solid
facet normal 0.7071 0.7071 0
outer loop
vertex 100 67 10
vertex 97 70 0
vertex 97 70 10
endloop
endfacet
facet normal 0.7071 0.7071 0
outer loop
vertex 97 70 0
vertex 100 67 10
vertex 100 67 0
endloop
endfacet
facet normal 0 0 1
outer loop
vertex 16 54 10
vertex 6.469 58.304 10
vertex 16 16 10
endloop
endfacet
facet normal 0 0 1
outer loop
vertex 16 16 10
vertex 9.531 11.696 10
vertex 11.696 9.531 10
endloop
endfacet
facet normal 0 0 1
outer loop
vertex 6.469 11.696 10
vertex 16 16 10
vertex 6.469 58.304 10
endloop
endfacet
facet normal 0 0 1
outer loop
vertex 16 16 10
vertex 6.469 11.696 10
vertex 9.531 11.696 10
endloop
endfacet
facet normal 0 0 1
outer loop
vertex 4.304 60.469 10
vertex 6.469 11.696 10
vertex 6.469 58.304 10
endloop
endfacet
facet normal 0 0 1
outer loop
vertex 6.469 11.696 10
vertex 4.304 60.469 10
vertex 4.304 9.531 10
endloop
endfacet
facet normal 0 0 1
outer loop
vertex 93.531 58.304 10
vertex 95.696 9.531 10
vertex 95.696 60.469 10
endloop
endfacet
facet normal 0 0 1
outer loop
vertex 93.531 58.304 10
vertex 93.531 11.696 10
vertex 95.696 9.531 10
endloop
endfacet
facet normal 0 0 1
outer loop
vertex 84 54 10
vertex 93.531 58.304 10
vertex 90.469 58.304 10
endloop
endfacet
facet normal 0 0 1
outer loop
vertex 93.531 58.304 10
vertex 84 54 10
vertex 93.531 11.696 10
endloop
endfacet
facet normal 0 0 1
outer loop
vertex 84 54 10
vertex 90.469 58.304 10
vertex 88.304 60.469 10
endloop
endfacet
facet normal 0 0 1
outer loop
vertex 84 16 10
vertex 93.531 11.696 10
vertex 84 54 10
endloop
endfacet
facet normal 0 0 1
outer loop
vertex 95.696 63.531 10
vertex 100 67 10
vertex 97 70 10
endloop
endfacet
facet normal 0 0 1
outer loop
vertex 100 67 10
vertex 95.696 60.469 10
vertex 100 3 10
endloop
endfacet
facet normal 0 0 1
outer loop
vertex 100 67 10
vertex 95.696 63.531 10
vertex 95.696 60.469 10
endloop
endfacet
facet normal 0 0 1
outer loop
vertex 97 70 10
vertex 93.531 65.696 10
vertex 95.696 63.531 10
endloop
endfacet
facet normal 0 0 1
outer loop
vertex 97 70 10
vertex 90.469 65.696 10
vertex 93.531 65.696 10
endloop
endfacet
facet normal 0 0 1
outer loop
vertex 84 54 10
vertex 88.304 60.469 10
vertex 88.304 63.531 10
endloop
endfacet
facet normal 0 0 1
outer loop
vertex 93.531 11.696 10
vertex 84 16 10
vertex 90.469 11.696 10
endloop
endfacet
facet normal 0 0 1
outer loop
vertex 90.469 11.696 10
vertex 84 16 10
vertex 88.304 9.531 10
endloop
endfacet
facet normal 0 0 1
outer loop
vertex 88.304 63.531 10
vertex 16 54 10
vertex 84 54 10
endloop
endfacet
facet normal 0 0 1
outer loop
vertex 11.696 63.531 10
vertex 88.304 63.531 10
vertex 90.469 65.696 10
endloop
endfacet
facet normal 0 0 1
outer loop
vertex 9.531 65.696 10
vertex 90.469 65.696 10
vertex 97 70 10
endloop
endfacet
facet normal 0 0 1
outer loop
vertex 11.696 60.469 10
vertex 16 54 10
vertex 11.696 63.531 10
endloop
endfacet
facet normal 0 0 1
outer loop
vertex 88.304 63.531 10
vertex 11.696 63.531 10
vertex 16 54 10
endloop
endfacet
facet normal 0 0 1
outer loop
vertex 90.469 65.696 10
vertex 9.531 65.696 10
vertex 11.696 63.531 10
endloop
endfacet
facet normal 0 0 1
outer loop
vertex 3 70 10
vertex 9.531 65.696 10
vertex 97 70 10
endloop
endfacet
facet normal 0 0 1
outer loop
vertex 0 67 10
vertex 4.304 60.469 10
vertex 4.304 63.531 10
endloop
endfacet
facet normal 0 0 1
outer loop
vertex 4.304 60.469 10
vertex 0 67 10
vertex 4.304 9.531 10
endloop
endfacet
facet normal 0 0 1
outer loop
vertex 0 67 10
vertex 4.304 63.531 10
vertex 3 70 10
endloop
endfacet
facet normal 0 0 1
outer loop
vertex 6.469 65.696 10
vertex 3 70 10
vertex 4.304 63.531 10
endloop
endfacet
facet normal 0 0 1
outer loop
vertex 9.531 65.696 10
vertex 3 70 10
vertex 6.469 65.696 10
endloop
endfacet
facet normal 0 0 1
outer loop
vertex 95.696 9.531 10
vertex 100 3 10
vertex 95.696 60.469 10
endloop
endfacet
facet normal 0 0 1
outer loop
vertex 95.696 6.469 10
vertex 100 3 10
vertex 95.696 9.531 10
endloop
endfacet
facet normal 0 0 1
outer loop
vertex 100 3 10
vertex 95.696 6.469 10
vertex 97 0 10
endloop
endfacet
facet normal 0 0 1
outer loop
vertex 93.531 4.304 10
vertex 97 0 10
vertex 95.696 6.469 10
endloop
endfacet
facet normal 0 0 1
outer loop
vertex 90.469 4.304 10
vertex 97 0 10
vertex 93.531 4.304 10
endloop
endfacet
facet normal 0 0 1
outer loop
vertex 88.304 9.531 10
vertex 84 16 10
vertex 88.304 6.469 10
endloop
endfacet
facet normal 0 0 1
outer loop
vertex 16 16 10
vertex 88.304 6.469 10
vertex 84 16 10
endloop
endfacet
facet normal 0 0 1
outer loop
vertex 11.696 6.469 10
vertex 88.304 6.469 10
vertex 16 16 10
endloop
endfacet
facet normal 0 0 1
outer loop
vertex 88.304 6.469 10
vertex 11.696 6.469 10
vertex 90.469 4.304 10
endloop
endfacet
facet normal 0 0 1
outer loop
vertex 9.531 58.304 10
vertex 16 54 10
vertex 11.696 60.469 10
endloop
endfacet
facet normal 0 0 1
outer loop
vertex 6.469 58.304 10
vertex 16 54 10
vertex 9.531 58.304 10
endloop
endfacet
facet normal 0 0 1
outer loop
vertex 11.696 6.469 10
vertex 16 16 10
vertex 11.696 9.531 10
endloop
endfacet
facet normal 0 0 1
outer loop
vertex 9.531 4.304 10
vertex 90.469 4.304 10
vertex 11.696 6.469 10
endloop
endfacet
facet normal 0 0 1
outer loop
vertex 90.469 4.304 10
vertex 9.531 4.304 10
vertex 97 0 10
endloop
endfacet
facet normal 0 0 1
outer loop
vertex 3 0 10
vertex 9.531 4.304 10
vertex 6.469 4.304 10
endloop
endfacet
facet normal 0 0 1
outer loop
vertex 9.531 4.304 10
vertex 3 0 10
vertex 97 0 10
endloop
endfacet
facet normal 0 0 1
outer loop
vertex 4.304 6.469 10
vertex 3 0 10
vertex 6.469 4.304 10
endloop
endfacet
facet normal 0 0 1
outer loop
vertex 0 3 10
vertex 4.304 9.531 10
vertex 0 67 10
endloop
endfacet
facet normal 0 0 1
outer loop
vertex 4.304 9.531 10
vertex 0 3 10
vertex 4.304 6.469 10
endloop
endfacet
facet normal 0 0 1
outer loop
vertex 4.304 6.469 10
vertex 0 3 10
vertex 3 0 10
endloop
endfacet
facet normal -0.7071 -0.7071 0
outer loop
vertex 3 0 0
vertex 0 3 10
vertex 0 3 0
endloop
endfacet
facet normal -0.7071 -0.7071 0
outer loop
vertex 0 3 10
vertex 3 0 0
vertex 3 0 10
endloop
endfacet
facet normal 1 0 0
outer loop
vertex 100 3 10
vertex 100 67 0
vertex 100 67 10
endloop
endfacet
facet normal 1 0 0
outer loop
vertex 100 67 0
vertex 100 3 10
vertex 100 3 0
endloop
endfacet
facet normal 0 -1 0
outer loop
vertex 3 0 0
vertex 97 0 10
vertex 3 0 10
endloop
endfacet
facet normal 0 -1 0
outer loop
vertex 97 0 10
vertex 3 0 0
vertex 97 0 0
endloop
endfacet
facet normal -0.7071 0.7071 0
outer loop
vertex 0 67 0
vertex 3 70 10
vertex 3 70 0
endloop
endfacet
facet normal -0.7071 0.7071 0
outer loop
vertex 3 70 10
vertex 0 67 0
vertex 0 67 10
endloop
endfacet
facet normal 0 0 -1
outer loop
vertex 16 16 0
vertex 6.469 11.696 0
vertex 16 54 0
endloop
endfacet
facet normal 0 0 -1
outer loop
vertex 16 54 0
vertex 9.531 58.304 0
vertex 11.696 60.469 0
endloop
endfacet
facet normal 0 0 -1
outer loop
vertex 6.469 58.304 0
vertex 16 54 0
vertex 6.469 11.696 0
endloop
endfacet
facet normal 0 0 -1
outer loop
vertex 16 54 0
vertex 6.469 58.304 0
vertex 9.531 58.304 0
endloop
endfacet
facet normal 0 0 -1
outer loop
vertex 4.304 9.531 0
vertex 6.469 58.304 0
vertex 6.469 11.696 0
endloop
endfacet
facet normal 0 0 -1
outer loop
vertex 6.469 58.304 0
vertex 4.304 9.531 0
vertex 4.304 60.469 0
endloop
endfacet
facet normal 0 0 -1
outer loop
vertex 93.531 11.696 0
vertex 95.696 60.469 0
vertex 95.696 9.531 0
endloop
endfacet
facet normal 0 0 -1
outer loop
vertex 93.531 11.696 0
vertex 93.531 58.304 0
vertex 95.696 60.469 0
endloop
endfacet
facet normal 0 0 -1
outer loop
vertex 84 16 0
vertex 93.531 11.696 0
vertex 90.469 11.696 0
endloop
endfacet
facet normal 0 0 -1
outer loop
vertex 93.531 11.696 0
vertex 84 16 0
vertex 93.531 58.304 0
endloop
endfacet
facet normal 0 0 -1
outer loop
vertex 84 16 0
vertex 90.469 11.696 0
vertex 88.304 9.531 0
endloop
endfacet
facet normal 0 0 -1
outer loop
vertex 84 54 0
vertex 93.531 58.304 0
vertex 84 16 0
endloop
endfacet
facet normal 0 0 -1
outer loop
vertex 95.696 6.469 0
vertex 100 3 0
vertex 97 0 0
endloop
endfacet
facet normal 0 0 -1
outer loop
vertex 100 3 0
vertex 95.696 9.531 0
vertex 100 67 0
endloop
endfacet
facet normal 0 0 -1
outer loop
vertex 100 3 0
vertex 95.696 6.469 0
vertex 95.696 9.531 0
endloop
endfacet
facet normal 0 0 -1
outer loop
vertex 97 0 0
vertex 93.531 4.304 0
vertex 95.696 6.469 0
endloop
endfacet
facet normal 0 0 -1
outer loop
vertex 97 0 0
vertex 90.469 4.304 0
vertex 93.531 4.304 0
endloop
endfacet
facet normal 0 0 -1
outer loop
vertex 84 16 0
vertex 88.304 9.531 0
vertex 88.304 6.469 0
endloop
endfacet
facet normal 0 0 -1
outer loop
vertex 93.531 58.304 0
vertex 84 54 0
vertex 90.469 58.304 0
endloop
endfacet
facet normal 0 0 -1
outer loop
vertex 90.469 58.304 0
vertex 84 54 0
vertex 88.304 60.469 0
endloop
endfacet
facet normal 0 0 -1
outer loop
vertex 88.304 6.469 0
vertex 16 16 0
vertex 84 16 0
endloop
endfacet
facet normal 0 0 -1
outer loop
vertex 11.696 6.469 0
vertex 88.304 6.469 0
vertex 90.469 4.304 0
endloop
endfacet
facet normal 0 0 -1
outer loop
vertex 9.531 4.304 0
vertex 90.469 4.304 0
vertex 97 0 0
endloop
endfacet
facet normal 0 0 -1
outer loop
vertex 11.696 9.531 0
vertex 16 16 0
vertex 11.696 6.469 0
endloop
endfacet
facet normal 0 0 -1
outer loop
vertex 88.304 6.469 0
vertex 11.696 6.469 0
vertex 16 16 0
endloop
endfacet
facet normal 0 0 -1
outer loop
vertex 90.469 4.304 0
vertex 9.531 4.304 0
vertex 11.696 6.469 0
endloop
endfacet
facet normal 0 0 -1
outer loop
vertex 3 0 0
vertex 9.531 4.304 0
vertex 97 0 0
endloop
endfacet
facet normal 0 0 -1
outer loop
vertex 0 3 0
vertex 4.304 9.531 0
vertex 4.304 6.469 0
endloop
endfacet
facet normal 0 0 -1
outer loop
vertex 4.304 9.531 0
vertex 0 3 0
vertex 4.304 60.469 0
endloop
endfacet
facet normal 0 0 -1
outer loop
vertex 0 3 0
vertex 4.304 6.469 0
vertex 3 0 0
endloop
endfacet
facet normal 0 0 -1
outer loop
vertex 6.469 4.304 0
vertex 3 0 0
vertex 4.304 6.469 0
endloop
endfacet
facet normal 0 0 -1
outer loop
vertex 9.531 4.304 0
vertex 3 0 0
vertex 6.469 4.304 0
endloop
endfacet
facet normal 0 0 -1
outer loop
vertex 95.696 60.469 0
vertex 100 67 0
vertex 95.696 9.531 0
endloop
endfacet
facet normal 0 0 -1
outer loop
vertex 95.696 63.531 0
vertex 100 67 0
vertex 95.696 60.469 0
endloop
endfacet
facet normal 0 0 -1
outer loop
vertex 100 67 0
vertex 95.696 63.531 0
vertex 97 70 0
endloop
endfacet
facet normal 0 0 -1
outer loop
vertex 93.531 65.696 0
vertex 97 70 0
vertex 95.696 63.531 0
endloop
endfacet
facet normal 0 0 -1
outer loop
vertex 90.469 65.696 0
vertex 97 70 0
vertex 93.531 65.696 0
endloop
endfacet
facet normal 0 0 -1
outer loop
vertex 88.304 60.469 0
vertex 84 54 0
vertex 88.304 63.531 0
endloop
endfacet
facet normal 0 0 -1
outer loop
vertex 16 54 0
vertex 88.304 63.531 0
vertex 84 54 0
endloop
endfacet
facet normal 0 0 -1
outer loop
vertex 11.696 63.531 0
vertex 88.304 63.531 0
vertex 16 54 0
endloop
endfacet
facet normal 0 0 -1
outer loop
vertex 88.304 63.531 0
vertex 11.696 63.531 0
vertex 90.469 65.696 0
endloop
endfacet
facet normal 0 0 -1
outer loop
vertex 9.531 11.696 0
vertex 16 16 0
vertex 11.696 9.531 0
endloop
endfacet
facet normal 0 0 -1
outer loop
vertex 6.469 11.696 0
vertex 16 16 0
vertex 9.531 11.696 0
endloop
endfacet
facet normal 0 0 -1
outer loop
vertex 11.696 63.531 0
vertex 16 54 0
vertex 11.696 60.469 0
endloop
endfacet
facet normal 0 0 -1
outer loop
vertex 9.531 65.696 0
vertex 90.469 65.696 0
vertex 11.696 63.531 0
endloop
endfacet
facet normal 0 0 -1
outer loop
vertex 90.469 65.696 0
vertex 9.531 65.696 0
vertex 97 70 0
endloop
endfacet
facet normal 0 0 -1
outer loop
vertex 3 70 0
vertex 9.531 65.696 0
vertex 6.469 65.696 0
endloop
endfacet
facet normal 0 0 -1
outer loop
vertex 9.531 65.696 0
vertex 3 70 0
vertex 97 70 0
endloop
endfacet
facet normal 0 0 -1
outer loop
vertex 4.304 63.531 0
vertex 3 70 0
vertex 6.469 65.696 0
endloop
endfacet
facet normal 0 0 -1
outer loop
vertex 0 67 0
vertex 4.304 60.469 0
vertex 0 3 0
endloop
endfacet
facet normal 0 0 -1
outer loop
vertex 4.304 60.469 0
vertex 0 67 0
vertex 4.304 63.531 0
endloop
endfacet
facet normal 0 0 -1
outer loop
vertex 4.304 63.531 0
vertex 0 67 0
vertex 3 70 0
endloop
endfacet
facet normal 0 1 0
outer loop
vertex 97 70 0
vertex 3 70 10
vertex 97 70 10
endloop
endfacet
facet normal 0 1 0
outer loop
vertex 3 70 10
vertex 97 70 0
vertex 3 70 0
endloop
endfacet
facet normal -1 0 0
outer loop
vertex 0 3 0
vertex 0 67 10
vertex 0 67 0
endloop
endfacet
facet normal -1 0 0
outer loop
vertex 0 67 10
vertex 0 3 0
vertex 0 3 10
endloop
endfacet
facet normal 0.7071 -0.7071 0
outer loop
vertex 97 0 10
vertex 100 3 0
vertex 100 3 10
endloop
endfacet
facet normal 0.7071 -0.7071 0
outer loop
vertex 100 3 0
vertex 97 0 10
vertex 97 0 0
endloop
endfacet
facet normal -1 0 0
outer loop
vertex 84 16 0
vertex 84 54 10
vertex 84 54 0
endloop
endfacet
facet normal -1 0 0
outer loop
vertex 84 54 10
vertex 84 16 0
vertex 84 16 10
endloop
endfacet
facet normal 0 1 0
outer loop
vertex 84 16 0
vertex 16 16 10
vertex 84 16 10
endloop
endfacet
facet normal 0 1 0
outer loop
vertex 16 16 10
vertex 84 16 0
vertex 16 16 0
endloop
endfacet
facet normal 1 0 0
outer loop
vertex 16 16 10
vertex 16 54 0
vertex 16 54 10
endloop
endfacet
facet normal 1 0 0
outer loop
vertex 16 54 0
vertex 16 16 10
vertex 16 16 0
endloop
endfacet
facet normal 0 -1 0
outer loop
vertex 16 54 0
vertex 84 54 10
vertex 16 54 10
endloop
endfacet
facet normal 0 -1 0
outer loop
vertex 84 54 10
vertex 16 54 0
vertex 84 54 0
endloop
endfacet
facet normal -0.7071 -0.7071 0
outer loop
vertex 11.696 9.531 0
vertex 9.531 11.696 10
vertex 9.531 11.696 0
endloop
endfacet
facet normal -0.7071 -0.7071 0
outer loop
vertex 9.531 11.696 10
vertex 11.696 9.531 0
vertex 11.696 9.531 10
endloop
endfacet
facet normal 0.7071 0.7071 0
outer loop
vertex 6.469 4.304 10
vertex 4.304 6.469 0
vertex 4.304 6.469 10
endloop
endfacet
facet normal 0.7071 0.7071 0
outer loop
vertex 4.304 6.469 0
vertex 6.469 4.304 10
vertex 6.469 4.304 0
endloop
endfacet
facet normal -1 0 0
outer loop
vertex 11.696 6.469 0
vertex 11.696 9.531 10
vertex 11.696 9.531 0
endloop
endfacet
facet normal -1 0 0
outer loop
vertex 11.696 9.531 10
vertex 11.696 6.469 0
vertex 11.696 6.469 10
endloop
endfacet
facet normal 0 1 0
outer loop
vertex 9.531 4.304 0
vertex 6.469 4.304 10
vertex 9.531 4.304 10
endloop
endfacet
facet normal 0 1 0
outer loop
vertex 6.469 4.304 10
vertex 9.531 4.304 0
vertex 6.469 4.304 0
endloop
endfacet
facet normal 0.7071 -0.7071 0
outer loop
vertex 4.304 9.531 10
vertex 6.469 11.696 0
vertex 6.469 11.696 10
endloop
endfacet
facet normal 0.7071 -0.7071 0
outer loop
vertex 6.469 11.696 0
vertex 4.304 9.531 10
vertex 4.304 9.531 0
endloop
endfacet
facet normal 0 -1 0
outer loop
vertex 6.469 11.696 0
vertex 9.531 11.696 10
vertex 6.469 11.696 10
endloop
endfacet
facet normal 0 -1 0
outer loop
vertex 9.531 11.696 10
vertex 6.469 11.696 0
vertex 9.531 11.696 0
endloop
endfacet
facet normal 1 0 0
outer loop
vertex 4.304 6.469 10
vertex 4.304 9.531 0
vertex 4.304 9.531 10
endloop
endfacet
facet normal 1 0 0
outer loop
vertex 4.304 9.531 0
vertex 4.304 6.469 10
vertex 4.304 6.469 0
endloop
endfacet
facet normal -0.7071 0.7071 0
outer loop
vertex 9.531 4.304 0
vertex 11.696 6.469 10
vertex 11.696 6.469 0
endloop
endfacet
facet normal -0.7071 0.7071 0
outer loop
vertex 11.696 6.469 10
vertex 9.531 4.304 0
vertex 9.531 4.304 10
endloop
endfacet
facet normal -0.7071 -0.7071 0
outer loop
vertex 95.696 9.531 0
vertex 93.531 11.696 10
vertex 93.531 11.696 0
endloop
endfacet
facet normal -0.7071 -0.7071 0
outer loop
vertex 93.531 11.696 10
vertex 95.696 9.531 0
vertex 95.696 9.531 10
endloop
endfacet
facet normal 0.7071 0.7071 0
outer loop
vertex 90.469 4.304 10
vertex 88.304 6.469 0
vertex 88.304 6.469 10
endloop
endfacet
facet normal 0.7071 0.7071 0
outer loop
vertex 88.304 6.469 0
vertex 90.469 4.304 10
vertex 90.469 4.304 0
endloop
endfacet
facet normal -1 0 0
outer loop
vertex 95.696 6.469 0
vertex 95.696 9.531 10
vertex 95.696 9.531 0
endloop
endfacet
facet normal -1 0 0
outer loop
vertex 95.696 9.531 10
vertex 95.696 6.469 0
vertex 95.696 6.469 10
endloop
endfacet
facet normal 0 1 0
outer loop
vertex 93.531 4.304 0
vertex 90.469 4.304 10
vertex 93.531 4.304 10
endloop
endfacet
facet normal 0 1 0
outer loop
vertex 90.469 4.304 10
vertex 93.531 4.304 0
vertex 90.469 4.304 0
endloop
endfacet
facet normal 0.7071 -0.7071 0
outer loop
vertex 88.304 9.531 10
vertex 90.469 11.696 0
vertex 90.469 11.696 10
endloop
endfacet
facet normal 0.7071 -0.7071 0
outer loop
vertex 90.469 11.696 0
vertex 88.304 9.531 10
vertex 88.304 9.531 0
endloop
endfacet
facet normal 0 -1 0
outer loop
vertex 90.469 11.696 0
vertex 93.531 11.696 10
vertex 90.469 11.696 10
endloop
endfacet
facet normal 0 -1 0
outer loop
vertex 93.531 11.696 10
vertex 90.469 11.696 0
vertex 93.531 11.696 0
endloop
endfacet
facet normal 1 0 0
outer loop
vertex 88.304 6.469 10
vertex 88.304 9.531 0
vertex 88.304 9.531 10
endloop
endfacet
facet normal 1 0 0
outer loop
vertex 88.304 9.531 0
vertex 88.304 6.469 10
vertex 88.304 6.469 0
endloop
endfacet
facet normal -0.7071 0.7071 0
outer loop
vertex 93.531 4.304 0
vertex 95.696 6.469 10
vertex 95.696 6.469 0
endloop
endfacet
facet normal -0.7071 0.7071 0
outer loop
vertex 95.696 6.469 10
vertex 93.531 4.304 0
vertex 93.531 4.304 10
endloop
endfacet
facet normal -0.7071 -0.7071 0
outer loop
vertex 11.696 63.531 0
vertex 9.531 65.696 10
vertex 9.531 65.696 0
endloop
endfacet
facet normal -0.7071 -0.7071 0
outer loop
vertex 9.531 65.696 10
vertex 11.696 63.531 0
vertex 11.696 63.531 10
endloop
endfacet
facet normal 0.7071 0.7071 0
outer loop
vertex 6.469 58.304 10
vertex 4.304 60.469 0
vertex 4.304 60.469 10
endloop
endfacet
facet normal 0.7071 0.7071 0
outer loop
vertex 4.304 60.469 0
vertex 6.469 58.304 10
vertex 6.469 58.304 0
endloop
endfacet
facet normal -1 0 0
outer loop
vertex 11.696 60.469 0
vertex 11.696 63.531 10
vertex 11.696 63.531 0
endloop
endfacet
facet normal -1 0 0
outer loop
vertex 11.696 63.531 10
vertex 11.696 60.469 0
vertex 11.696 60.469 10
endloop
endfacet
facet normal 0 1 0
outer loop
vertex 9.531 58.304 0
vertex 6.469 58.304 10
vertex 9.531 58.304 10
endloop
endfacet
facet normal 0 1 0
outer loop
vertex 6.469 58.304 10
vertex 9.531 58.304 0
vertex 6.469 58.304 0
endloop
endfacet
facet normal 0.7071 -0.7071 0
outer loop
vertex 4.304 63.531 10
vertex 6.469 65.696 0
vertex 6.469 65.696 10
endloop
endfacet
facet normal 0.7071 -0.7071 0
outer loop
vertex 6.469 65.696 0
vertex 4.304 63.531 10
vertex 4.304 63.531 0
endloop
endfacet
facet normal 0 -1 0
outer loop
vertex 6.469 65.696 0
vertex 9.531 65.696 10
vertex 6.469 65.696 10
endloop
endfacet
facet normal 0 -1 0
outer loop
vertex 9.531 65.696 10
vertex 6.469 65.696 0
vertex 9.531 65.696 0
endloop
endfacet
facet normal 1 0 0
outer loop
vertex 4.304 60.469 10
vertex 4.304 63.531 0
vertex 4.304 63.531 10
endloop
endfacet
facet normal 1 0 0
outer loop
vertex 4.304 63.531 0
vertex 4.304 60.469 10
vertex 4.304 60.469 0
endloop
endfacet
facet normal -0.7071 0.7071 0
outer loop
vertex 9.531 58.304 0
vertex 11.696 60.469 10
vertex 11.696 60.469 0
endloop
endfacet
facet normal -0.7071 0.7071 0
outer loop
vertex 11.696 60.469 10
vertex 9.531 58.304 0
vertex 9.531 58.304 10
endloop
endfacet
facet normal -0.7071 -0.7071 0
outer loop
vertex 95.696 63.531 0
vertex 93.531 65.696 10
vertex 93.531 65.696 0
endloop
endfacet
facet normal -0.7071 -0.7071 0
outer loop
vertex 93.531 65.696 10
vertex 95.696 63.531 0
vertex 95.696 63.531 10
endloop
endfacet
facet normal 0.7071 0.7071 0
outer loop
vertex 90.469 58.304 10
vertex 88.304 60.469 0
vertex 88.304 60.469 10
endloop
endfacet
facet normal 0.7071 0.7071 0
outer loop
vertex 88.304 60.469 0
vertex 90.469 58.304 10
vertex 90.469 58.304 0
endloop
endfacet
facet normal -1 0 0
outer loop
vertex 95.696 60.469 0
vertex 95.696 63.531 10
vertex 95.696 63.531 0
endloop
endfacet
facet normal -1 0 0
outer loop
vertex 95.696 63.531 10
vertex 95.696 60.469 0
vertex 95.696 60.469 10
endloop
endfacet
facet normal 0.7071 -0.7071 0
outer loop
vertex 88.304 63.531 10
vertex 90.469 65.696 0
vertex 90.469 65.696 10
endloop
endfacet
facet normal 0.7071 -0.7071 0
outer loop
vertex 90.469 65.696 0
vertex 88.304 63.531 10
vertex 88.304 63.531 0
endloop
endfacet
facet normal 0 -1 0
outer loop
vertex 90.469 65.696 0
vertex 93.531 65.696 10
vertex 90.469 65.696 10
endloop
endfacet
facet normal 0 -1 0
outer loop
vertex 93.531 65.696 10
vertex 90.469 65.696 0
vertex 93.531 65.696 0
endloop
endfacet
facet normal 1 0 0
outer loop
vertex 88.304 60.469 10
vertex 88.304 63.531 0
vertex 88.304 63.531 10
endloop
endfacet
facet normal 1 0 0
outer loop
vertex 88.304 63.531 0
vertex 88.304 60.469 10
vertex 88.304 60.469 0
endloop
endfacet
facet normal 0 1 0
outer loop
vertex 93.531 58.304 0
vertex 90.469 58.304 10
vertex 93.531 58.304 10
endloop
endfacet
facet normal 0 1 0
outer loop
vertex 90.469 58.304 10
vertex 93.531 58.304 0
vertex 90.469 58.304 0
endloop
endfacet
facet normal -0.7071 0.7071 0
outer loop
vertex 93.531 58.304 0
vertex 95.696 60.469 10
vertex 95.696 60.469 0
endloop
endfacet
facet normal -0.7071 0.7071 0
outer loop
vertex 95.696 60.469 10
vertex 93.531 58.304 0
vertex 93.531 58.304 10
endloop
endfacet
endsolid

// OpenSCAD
$fn = 32;

// ----------------------------------------------------------------------
// Frame plate: 100 x 70 frame, 16 mm rails
// ----------------------------------------------------------------------

// --- parameters (mm) ---
plate_l = 100;            // plate length, X
plate_w = 70;             // plate width, Y
plate_t = 10;             // plate thickness, Z (extrusion height)
corner_c = 3;             // corner chamfer
frame_bar = 16;           // frame rail width
bolt_r = 4;               // corner bolt window radius
bolt_inset = 8;           // bolt centre inset from the edges

win_l = plate_l - 2 * frame_bar;  // window length
win_w = plate_w - 2 * frame_bar;  // window width
bolt_d = 2 * bolt_r;  // corner hole diameter

profile = [[3, 0], [97, 0], [100, 3], [100, 67], [97, 70], [3, 70], [0, 67], [0, 3]];  // primary outline, 8 points, counter clockwise
void_1 = [[16, 16], [84, 16], [84, 54], [16, 54]];  // the window, 4 points
void_2 = [[11.696, 9.531], [9.531, 11.696], [6.469, 11.696], [4.304, 9.531], [4.304, 6.469], [6.469, 4.304], [9.531, 4.304], [11.696, 6.469]];  // corner bolt window, 8 points
void_3 = [[95.696, 9.531], [93.531, 11.696], [90.469, 11.696], [88.304, 9.531], [88.304, 6.469], [90.469, 4.304], [93.531, 4.304], [95.696, 6.469]];  // corner bolt window, 8 points
void_4 = [[11.696, 63.531], [9.531, 65.696], [6.469, 65.696], [4.304, 63.531], [4.304, 60.469], [6.469, 58.304], [9.531, 58.304], [11.696, 60.469]];  // corner bolt window, 8 points
void_5 = [[95.696, 63.531], [93.531, 65.696], [90.469, 65.696], [88.304, 63.531], [88.304, 60.469], [90.469, 58.304], [93.531, 58.304], [95.696, 60.469]];  // corner bolt window, 8 points

// --- the one profile operation ---
difference() {
  linear_extrude(height = plate_t) polygon(points = profile);
  translate([0, 0, -1])
    linear_extrude(height = plate_t + 2) polygon(points = void_1);
  translate([0, 0, -1])
    linear_extrude(height = plate_t + 2) polygon(points = void_2);
  translate([0, 0, -1])
    linear_extrude(height = plate_t + 2) polygon(points = void_3);
  translate([0, 0, -1])
    linear_extrude(height = plate_t + 2) polygon(points = void_4);
  translate([0, 0, -1])
    linear_extrude(height = plate_t + 2) polygon(points = void_5);
}
